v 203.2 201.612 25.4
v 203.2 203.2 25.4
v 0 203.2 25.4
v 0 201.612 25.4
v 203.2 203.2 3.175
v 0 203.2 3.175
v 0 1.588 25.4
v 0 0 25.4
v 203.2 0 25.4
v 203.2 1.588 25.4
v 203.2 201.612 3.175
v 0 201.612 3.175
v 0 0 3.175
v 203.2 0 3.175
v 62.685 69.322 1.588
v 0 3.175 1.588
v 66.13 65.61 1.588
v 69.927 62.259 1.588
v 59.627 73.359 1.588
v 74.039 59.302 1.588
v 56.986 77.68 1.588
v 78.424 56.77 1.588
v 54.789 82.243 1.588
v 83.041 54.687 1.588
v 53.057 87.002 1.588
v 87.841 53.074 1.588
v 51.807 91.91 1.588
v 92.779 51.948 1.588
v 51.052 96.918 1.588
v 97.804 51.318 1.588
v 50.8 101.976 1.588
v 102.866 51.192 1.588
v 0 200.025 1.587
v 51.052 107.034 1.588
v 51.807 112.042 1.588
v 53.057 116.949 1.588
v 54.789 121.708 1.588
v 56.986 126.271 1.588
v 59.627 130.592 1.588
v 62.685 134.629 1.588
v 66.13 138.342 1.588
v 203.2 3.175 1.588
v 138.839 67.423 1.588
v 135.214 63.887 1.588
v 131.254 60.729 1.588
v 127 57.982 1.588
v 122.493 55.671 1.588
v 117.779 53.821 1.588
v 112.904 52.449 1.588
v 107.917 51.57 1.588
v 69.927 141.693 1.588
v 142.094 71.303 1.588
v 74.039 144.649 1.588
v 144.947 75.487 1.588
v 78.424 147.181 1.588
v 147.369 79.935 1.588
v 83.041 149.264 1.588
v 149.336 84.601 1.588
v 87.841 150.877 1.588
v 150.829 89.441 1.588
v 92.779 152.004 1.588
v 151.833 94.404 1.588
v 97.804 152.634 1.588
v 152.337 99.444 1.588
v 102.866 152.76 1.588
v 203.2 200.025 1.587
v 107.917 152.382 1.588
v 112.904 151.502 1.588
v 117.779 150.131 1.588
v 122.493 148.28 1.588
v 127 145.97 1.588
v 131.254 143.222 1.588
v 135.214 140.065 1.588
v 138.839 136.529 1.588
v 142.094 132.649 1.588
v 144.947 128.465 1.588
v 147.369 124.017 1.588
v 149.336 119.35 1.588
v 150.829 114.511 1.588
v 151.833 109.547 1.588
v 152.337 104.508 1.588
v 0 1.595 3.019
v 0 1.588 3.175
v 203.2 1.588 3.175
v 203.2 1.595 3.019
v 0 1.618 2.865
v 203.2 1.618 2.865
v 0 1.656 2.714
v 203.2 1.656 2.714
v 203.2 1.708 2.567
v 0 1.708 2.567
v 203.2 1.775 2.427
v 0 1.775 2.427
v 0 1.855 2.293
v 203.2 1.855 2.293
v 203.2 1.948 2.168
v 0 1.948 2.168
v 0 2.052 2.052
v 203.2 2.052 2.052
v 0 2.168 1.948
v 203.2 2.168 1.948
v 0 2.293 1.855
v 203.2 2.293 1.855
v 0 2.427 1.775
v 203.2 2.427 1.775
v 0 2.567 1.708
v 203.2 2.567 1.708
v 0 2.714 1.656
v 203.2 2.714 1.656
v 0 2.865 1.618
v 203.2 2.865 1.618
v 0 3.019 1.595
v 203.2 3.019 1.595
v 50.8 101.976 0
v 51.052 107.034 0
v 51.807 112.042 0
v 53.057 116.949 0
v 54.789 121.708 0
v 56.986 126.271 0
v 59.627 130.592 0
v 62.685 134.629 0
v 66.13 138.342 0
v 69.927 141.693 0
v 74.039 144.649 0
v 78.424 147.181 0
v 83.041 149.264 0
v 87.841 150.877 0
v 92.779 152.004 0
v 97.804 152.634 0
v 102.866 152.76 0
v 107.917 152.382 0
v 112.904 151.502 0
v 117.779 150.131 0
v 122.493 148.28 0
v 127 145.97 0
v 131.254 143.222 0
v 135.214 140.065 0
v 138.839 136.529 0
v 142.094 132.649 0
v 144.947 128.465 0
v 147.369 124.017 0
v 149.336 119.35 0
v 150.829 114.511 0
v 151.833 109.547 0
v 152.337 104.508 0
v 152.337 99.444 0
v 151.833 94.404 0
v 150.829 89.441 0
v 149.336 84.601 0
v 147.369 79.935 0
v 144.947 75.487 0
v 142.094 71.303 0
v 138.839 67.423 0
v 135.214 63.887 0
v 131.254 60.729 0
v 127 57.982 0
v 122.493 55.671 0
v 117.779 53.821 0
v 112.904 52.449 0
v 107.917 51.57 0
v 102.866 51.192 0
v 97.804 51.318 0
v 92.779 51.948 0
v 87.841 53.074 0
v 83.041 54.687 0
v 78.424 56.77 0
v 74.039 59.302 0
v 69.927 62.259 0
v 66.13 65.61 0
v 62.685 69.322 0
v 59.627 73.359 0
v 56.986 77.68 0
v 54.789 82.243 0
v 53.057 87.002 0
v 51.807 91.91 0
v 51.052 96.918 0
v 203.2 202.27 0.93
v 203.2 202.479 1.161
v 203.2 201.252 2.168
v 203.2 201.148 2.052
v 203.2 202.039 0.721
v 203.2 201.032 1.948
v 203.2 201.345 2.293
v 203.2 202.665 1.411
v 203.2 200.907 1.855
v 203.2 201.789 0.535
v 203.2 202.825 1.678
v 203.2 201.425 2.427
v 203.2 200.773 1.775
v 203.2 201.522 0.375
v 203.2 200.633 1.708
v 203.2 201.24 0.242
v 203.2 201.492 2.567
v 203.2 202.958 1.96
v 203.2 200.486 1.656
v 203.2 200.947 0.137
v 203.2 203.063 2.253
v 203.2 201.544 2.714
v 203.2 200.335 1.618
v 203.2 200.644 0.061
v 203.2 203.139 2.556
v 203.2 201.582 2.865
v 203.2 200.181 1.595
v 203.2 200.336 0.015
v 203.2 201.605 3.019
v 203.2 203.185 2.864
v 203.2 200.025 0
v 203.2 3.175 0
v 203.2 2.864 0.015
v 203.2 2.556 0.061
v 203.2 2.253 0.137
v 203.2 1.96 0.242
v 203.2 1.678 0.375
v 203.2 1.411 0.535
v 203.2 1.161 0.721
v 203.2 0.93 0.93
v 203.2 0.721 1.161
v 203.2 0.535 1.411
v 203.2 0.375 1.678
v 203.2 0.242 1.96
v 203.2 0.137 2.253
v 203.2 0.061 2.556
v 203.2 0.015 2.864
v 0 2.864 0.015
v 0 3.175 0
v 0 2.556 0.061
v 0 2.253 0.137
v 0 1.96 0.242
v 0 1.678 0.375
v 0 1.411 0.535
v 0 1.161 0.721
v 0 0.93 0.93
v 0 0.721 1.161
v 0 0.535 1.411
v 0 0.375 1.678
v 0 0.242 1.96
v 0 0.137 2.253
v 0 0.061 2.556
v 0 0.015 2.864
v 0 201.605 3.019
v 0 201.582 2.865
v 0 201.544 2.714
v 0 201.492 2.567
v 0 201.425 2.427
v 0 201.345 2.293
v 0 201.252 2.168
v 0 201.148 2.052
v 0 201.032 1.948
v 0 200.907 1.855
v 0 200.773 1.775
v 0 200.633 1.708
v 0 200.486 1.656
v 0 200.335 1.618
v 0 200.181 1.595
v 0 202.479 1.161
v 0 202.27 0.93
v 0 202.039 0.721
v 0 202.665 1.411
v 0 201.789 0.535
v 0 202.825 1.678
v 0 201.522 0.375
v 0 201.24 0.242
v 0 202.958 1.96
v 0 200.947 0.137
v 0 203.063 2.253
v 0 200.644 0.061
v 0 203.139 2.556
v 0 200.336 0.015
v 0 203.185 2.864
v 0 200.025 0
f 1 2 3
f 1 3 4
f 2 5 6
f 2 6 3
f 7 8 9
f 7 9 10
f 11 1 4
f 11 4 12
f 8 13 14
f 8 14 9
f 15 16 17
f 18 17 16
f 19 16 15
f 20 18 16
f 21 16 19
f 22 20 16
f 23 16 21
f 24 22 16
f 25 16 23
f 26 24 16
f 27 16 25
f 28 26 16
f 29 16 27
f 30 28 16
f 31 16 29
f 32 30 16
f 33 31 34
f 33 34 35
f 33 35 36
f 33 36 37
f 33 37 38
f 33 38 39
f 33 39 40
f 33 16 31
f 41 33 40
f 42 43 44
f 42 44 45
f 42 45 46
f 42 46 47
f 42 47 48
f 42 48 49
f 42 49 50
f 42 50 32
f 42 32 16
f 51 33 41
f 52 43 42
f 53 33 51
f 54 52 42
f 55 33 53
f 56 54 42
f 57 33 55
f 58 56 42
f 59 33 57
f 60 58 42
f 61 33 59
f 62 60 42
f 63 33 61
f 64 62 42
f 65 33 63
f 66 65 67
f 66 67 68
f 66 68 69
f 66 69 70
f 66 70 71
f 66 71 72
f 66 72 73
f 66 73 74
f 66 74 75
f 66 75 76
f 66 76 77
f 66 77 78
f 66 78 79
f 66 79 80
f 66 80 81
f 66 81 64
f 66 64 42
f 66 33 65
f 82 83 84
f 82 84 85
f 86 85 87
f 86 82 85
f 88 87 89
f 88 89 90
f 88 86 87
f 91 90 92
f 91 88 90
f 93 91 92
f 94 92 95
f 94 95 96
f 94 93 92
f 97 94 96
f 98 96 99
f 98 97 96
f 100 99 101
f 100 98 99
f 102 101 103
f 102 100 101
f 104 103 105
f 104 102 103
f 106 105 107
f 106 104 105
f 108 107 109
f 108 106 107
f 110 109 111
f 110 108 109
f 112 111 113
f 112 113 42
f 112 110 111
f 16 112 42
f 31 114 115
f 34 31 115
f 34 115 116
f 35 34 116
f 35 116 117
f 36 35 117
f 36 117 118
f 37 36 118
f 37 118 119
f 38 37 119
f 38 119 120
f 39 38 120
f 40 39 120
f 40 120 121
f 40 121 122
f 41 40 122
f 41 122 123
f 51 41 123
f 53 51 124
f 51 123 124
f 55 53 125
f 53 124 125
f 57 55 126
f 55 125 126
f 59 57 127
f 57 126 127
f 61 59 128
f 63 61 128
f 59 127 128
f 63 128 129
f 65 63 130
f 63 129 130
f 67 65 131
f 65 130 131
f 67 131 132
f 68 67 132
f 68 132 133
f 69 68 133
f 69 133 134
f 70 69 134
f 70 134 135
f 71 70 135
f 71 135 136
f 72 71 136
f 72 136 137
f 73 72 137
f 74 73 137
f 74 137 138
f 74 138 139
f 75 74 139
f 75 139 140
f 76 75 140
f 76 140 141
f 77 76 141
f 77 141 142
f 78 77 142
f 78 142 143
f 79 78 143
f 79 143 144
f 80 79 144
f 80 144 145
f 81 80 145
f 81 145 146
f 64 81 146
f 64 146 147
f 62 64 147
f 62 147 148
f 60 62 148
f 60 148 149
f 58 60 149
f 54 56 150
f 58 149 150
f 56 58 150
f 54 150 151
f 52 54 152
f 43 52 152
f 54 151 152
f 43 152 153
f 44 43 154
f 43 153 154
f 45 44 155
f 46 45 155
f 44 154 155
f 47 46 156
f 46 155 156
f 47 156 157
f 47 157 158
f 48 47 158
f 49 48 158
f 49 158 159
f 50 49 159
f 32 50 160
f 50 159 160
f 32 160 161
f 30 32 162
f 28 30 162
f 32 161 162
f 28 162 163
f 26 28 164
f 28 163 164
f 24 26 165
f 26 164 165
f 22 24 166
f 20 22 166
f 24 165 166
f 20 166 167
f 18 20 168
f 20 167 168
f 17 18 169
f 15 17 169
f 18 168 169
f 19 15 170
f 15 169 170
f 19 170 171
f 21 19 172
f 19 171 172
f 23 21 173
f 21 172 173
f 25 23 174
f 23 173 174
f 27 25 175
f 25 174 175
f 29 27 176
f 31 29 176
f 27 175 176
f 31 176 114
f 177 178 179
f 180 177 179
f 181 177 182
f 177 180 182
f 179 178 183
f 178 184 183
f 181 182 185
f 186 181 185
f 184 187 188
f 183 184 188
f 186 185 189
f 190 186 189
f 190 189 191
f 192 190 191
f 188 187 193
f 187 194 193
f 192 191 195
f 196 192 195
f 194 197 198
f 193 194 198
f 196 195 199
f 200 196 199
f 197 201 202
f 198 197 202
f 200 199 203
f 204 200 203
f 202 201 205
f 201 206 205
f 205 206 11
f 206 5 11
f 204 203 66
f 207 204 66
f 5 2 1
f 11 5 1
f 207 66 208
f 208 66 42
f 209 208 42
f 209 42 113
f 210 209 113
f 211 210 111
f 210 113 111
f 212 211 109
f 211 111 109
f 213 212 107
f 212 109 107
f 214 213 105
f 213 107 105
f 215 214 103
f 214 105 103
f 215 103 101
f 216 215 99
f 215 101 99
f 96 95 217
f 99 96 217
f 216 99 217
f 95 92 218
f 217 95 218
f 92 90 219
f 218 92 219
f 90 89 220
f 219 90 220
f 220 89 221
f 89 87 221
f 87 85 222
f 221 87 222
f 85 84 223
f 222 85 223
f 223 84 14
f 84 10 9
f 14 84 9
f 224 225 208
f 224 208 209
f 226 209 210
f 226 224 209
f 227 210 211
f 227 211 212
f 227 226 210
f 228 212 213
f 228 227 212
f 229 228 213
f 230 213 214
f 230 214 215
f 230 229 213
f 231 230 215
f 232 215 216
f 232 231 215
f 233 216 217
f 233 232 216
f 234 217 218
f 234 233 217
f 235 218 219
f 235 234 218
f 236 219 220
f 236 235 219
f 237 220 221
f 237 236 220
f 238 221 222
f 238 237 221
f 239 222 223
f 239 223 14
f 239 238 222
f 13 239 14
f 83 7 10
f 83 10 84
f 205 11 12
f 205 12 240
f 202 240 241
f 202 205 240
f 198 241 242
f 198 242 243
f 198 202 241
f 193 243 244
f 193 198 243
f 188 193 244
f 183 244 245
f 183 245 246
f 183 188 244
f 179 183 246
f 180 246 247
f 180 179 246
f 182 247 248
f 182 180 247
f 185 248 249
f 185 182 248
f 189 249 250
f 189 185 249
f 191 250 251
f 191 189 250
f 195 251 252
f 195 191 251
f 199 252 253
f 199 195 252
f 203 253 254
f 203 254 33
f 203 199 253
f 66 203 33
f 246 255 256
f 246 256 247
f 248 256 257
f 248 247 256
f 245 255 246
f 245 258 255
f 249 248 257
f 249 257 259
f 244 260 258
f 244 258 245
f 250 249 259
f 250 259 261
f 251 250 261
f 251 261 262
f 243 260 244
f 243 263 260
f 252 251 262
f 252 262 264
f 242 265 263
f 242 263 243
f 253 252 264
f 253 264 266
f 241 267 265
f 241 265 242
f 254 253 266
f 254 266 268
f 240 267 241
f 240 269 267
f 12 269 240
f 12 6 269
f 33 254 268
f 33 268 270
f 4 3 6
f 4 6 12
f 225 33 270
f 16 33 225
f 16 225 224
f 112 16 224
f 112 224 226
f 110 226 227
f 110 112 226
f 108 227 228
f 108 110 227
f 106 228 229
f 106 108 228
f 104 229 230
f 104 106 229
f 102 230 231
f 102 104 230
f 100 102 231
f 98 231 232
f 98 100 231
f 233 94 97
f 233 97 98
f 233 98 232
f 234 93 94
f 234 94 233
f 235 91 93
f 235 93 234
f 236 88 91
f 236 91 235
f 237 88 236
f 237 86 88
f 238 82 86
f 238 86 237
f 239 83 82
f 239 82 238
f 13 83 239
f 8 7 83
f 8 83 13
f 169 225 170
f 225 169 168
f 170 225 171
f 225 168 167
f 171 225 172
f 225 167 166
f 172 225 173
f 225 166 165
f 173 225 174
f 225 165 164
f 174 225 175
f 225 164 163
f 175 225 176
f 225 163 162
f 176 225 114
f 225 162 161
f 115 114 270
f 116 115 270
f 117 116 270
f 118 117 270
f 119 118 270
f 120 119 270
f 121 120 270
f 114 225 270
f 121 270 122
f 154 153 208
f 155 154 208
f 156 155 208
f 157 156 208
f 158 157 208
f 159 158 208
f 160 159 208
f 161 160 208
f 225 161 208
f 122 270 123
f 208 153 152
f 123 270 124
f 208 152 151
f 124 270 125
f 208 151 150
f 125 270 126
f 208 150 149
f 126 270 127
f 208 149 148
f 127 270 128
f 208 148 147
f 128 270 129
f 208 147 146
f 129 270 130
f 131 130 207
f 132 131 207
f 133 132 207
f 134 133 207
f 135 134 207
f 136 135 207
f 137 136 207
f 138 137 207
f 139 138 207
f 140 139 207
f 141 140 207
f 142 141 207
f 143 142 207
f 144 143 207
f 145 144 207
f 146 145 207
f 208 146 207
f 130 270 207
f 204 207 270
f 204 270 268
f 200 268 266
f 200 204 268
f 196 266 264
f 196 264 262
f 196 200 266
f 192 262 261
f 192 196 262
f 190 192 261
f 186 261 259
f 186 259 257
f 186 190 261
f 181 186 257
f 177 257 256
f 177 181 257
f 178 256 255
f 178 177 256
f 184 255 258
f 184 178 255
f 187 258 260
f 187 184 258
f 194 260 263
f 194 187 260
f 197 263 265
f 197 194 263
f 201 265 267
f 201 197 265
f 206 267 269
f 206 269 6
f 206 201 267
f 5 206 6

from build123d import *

# Parameters (mm, degrees)
SKETCH1_W                      = 203.2
SKETCH1_H                      = 203.2
BOSS_EXTRUDE2_DEPTH            = 1.5875
EDGE_FLANGE1_STRIP_W           = 9.525
EDGE_FLANGE1_STRIP_H           = 1.5875
EDGE_FLANGE1_STRIP_CUT_DEPTH   = 203.2
EDGE_FLANGE1_STRIP_2_W         = 9.525
EDGE_FLANGE1_STRIP_2_H         = 1.5875
EDGE_FLANGE1_STRIP_CUT_2_DEPTH = 203.2
EDGE_FLANGE1_DEPTH             = 203.2
EDGE_FLANGE1_BEND_DEPTH        = 203.2
SKETCH16_R                     = 50.8
CUT_EXTRUDE1_DEPTH             = 2.54


# Sheet-metal steps are written as plain solids
with BuildPart() as part:
    # Sketch1 → Boss-Extrude2 (new body)
    with BuildSketch(Plane.XY):
        with Locations((101.6, 101.6)):
            Rectangle(SKETCH1_W, SKETCH1_H)
    extrude(amount=BOSS_EXTRUDE2_DEPTH)

    # Edge-Flange1 strip (across the edge) → Edge-Flange1 strip cut (cut)
    with BuildSketch(Plane(origin=(203.2, 203.2, 1.5875), x_dir=(0, -1, 0), z_dir=(-1, 0, 0))):
        with Locations((-1.5875, -0.79375)):
            Rectangle(EDGE_FLANGE1_STRIP_W, EDGE_FLANGE1_STRIP_H)
    extrude(amount=EDGE_FLANGE1_STRIP_CUT_DEPTH, mode=Mode.SUBTRACT)

    # Edge-Flange1 strip 2 (across the edge) → Edge-Flange1 strip cut 2 (cut)
    with BuildSketch(Plane(origin=(0, 0, 1.5875), x_dir=(0, 1, 0), z_dir=(1, 0, 0))):
        with Locations((-1.5875, -0.79375)):
            Rectangle(EDGE_FLANGE1_STRIP_2_W, EDGE_FLANGE1_STRIP_2_H)
    extrude(amount=EDGE_FLANGE1_STRIP_CUT_2_DEPTH, mode=Mode.SUBTRACT)

    # Edge-Flange1 section (across the edge) → Edge-Flange1 (add)
    with BuildSketch(Plane(origin=(203.2, 203.2, 1.5875), x_dir=(0, -1, 0), z_dir=(-1, 0, 0))):
        with BuildLine():
            Line((0, 1.5875), (0, 23.8125))
            Line((0, 23.8125), (1.5875, 23.8125))
            Line((1.5875, 23.8125), (1.5875, 1.5875))
            ThreePointArc((1.5875, 1.5875), (2.052467985, 0.464967985), (3.175, 0))
            Line((3.175, 0), (3.175, -1.5875))
            ThreePointArc((3.175, -1.5875), (0.92993597, -0.65756403), (0, 1.5875))
        make_face()
    extrude(amount=EDGE_FLANGE1_DEPTH)

    # Edge-Flange1 section 2 (across the edge) → Edge-Flange1 bend (add)
    with BuildSketch(Plane(origin=(0, 0, 1.5875), x_dir=(0, 1, 0), z_dir=(1, 0, 0))):
        with BuildLine():
            Line((0, 1.5875), (0, 23.8125))
            Line((0, 23.8125), (1.5875, 23.8125))
            Line((1.5875, 23.8125), (1.5875, 1.5875))
            ThreePointArc((1.5875, 1.5875), (2.052467985, 0.464967985), (3.175, 0))
            Line((3.175, 0), (3.175, -1.5875))
            ThreePointArc((3.175, -1.5875), (0.92993597, -0.65756403), (0, 1.5875))
        make_face()
    extrude(amount=EDGE_FLANGE1_BEND_DEPTH)

    # Sketch16 → Cut-Extrude1 (cut)
    with BuildSketch(Plane(origin=(0, 0, 0), x_dir=(-1, 0, 0), z_dir=(0, 0, -1))):
        with Locations((-101.6, 101.975799724)):
            Circle(SKETCH16_R)
    extrude(amount=-CUT_EXTRUDE1_DEPTH, mode=Mode.SUBTRACT)


solid = part.part
